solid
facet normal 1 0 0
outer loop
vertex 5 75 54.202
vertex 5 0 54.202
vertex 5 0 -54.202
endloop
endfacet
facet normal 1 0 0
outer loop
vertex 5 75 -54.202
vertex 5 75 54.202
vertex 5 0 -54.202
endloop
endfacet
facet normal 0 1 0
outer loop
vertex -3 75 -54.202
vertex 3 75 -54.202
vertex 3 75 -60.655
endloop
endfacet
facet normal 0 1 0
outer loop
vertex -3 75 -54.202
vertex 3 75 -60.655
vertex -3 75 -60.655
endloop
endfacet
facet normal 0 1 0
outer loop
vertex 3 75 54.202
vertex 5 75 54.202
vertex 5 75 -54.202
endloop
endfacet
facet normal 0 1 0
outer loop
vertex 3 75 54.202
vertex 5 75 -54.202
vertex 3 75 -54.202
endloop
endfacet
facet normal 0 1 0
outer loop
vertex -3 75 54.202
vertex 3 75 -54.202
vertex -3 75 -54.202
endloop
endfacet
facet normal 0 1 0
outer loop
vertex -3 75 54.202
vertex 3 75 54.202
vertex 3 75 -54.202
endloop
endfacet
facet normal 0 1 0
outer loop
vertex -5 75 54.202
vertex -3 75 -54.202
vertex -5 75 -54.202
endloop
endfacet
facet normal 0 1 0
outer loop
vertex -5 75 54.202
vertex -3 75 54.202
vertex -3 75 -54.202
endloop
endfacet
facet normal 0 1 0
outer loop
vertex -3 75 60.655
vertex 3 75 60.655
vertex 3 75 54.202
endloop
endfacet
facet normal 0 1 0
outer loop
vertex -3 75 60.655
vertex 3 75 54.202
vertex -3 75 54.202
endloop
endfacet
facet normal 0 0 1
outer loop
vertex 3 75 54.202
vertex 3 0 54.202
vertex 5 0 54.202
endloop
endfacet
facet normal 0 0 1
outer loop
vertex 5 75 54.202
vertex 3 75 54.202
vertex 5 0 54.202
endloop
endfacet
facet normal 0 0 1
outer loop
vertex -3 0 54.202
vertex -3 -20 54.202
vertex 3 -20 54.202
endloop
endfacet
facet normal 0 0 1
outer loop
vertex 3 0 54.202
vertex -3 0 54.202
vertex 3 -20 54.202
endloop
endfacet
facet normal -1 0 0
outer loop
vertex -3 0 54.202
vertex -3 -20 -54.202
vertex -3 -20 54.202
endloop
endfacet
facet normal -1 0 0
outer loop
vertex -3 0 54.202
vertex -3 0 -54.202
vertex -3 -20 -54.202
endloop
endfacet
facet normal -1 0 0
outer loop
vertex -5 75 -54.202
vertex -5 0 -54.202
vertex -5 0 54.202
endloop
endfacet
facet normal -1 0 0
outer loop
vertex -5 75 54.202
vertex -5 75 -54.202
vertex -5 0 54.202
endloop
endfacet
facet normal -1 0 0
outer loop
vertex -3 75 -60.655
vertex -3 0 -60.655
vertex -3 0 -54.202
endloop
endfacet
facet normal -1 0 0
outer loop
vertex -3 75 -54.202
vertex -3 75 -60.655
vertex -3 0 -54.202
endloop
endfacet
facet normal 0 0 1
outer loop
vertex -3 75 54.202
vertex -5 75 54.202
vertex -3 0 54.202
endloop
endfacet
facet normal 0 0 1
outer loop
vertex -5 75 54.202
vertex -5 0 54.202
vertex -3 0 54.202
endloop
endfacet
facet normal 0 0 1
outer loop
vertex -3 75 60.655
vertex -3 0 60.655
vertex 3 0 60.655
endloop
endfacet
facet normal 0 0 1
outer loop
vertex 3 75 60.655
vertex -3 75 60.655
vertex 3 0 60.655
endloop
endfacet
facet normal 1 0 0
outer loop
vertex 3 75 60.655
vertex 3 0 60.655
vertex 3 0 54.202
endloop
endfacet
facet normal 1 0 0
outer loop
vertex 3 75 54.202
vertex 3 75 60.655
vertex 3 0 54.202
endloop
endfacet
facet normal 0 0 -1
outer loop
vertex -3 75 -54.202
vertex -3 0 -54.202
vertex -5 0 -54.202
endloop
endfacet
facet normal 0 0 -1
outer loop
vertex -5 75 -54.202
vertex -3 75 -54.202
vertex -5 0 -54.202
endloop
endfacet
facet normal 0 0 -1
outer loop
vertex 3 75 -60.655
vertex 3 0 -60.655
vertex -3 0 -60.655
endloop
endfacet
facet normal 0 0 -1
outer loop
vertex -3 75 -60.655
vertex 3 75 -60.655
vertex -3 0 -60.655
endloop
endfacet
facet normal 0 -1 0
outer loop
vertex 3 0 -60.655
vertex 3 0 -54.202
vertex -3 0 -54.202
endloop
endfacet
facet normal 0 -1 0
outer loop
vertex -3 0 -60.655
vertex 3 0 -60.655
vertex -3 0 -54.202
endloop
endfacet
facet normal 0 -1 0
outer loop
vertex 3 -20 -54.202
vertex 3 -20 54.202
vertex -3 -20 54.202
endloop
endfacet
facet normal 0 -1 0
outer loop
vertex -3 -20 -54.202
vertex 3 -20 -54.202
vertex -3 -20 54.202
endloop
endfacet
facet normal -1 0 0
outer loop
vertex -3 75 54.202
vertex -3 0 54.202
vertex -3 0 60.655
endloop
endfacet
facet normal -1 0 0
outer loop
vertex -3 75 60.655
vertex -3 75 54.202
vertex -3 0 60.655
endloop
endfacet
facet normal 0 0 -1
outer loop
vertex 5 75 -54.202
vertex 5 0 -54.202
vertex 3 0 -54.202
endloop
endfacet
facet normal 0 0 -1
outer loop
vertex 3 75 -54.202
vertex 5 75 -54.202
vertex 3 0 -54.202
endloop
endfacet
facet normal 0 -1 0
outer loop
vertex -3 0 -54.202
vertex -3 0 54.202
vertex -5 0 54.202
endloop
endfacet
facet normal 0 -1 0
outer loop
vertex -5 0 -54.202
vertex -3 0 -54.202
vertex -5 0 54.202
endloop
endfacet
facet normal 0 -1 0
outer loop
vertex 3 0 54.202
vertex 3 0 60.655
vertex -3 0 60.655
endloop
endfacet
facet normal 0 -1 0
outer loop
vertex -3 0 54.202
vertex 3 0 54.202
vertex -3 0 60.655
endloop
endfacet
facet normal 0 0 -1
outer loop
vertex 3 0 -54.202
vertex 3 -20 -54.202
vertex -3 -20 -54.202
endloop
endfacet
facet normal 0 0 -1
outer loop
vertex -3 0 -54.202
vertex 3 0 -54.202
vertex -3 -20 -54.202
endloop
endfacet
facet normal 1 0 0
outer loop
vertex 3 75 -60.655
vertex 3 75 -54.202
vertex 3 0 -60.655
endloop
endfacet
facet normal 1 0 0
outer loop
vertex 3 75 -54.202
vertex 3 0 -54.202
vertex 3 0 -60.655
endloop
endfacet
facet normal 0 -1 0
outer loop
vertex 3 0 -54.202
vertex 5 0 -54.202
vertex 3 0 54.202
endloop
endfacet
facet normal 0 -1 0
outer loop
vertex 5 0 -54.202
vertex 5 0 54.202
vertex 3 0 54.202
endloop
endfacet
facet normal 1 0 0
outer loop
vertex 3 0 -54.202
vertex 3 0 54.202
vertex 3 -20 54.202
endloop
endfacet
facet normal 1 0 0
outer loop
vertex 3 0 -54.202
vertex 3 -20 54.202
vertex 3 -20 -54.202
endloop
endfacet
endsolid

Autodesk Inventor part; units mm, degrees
ref_plane "YZ Plane" through (0, 0, 0) normal (1, 0, 0) x (0, 1, 0)
ref_plane "XZ Plane" through (0, 0, 0) normal (0, 1, 0) x (-1, 0, 0)
ref_plane "XY Plane" through (0, 0, 0) normal (0, 0, 1) x (1, 0, 0)
sketch "Sketch1" plane through (0, 0, 0) normal (0, 1, 0) x (-1, 0, 0)
  point P0 (0, 0)
sketch "Sketch2" plane through (0, 0, 0) normal (0, 1, 0) x (-1, 0, 0)
  line L0 (5, 54.202) -> (-5, 54.202)
  line L1 (-5, 54.202) -> (-5, -54.202)
  line L2 (-5, -54.202) -> (5, -54.202)
  line L3 (5, -54.202) -> (5, 54.202)
  line L4 (5, 54.202) -> (-5, -54.202) construction
  line L5 (-5, 54.202) -> (5, -54.202) construction
  line L6 (3, 60.655) -> (-3, 60.655)
  line L7 (-3, 60.655) -> (-3, -60.655)
  line L8 (-3, -60.655) -> (3, -60.655)
  line L9 (3, -60.655) -> (3, 60.655)
  line L10 (3, 60.655) -> (-3, -60.655) construction
  line L11 (-3, 60.655) -> (3, -60.655) construction
  point P0 (0, 0)
  point P1 (3, 54.202)
  point P2 (-3, 54.202)
  point P3 (-3, -54.202)
  point P4 (3, -54.202)
  dimension "d0" = 10
  dimension "d1" = 108.404
  dimension "d2" = 6
  dimension "d3" = 121.31
extrude "Extrusion1" add sketch "Sketch2" along normal blind 75
extrude "Extrusion2" add sketch "Sketch2" against normal blind 20 contours L9 L2 L7 L0
properties part number "sciana_bezdziury" material "ABS Plastic"
